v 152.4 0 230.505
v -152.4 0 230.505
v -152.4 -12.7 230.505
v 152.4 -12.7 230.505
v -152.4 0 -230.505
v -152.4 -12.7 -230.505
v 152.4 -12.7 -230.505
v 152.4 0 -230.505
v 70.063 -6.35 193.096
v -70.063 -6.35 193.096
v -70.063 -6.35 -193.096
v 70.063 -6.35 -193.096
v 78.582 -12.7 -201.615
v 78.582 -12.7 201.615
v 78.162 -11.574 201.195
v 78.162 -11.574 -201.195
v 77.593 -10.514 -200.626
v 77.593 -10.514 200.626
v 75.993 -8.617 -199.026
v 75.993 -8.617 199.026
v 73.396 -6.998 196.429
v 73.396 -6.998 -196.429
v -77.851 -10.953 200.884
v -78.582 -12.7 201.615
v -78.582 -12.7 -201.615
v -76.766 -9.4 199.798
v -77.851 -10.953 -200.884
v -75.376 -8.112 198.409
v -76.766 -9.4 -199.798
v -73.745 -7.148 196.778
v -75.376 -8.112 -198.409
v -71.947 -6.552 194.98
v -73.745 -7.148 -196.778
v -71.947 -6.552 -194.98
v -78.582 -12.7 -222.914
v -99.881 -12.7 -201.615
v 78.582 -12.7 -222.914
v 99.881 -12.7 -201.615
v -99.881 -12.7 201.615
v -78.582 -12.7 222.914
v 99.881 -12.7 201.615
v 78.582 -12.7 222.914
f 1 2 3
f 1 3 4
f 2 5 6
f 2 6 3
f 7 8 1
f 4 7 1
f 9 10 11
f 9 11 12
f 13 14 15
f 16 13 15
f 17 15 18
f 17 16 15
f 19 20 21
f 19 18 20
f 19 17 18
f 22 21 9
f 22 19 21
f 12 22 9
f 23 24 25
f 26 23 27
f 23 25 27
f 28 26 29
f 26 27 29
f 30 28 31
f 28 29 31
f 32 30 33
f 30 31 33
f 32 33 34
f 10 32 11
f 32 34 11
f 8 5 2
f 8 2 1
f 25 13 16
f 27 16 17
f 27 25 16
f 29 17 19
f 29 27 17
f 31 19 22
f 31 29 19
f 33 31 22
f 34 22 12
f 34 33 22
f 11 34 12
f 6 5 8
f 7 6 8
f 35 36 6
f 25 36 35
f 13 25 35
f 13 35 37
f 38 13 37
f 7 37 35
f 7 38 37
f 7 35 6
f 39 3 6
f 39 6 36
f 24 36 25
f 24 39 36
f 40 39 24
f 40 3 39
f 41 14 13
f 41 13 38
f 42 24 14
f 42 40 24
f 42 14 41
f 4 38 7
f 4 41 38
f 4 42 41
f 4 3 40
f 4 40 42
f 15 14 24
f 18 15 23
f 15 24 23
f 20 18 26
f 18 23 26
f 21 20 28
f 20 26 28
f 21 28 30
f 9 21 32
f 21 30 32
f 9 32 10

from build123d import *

# Parameters (mm, degrees)
F0_W        = 304.8
F0_H        = 461.01
F1_DEPTH    = 12.7
F2_W        = 157.1649909019
F2_H        = 403.2308459282
F3_DEPTH    = 6.35
F4_T1_DEPTH = 445.8279408996
F4_T3_DEPTH = 199.7620858733


# Not quite as in the source:
# - a fillet or chamfer that OpenCascade refuses, or shapes differently, is made with other operations: its cross-section is extruded or revolved along the edge and cut away or added


with BuildPart() as f1:
    # F0 (on Front) → F1 (new body)
    with BuildSketch(Plane.XZ):
        Rectangle(F0_W, F0_H)
    extrude(amount=F1_DEPTH)

    # F2 (on face) → F3 (cut)
    with BuildSketch(Plane.XZ.offset(12.7)):
        Rectangle(F2_W, F2_H)
    extrude(amount=-F3_DEPTH, mode=Mode.SUBTRACT)

    # F4: fillet of radius 8.89 on 4 edges, made by hand

    # F4_s2 → F4_t1 (join)
    with BuildSketch(Plane.XY.offset(-222.9139704498)):
        with BuildLine():
            ThreePointArc((78.582495451, -12.7), (75.3758676252, -8.1121426782), (70.0630764567, -6.35))
            Line((70.0630764567, -6.35), (78.582495451, -6.35))
            Line((78.582495451, -6.35), (78.582495451, -12.7))
        make_face()
        with BuildLine():
            ThreePointArc((-78.582495451, -12.7), (-75.3758676252, -8.1121426782), (-70.0630764567, -6.35))
            Line((-70.0630764567, -6.35), (-78.582495451, -6.35))
            Line((-78.582495451, -6.35), (-78.582495451, -12.7))
        make_face()
    extrude(amount=F4_T1_DEPTH)

    # F4_s4 → F4_t3 (join)
    with BuildSketch(Plane.YZ.offset(-99.8810429367)):
        with BuildLine():
            ThreePointArc((-12.7, 201.6154229641), (-8.1121426782, 198.4087951383), (-6.35, 193.0960039698))
            Line((-6.35, 193.0960039698), (-6.35, 201.6154229641))
            Line((-6.35, 201.6154229641), (-12.7, 201.6154229641))
        make_face()
        with BuildLine():
            ThreePointArc((-12.7, -201.6154229641), (-8.1121426782, -198.4087951383), (-6.35, -193.0960039698))
            Line((-6.35, -193.0960039698), (-6.35, -201.6154229641))
            Line((-6.35, -201.6154229641), (-12.7, -201.6154229641))
        make_face()
    extrude(amount=F4_T3_DEPTH)


solid = f1.part
